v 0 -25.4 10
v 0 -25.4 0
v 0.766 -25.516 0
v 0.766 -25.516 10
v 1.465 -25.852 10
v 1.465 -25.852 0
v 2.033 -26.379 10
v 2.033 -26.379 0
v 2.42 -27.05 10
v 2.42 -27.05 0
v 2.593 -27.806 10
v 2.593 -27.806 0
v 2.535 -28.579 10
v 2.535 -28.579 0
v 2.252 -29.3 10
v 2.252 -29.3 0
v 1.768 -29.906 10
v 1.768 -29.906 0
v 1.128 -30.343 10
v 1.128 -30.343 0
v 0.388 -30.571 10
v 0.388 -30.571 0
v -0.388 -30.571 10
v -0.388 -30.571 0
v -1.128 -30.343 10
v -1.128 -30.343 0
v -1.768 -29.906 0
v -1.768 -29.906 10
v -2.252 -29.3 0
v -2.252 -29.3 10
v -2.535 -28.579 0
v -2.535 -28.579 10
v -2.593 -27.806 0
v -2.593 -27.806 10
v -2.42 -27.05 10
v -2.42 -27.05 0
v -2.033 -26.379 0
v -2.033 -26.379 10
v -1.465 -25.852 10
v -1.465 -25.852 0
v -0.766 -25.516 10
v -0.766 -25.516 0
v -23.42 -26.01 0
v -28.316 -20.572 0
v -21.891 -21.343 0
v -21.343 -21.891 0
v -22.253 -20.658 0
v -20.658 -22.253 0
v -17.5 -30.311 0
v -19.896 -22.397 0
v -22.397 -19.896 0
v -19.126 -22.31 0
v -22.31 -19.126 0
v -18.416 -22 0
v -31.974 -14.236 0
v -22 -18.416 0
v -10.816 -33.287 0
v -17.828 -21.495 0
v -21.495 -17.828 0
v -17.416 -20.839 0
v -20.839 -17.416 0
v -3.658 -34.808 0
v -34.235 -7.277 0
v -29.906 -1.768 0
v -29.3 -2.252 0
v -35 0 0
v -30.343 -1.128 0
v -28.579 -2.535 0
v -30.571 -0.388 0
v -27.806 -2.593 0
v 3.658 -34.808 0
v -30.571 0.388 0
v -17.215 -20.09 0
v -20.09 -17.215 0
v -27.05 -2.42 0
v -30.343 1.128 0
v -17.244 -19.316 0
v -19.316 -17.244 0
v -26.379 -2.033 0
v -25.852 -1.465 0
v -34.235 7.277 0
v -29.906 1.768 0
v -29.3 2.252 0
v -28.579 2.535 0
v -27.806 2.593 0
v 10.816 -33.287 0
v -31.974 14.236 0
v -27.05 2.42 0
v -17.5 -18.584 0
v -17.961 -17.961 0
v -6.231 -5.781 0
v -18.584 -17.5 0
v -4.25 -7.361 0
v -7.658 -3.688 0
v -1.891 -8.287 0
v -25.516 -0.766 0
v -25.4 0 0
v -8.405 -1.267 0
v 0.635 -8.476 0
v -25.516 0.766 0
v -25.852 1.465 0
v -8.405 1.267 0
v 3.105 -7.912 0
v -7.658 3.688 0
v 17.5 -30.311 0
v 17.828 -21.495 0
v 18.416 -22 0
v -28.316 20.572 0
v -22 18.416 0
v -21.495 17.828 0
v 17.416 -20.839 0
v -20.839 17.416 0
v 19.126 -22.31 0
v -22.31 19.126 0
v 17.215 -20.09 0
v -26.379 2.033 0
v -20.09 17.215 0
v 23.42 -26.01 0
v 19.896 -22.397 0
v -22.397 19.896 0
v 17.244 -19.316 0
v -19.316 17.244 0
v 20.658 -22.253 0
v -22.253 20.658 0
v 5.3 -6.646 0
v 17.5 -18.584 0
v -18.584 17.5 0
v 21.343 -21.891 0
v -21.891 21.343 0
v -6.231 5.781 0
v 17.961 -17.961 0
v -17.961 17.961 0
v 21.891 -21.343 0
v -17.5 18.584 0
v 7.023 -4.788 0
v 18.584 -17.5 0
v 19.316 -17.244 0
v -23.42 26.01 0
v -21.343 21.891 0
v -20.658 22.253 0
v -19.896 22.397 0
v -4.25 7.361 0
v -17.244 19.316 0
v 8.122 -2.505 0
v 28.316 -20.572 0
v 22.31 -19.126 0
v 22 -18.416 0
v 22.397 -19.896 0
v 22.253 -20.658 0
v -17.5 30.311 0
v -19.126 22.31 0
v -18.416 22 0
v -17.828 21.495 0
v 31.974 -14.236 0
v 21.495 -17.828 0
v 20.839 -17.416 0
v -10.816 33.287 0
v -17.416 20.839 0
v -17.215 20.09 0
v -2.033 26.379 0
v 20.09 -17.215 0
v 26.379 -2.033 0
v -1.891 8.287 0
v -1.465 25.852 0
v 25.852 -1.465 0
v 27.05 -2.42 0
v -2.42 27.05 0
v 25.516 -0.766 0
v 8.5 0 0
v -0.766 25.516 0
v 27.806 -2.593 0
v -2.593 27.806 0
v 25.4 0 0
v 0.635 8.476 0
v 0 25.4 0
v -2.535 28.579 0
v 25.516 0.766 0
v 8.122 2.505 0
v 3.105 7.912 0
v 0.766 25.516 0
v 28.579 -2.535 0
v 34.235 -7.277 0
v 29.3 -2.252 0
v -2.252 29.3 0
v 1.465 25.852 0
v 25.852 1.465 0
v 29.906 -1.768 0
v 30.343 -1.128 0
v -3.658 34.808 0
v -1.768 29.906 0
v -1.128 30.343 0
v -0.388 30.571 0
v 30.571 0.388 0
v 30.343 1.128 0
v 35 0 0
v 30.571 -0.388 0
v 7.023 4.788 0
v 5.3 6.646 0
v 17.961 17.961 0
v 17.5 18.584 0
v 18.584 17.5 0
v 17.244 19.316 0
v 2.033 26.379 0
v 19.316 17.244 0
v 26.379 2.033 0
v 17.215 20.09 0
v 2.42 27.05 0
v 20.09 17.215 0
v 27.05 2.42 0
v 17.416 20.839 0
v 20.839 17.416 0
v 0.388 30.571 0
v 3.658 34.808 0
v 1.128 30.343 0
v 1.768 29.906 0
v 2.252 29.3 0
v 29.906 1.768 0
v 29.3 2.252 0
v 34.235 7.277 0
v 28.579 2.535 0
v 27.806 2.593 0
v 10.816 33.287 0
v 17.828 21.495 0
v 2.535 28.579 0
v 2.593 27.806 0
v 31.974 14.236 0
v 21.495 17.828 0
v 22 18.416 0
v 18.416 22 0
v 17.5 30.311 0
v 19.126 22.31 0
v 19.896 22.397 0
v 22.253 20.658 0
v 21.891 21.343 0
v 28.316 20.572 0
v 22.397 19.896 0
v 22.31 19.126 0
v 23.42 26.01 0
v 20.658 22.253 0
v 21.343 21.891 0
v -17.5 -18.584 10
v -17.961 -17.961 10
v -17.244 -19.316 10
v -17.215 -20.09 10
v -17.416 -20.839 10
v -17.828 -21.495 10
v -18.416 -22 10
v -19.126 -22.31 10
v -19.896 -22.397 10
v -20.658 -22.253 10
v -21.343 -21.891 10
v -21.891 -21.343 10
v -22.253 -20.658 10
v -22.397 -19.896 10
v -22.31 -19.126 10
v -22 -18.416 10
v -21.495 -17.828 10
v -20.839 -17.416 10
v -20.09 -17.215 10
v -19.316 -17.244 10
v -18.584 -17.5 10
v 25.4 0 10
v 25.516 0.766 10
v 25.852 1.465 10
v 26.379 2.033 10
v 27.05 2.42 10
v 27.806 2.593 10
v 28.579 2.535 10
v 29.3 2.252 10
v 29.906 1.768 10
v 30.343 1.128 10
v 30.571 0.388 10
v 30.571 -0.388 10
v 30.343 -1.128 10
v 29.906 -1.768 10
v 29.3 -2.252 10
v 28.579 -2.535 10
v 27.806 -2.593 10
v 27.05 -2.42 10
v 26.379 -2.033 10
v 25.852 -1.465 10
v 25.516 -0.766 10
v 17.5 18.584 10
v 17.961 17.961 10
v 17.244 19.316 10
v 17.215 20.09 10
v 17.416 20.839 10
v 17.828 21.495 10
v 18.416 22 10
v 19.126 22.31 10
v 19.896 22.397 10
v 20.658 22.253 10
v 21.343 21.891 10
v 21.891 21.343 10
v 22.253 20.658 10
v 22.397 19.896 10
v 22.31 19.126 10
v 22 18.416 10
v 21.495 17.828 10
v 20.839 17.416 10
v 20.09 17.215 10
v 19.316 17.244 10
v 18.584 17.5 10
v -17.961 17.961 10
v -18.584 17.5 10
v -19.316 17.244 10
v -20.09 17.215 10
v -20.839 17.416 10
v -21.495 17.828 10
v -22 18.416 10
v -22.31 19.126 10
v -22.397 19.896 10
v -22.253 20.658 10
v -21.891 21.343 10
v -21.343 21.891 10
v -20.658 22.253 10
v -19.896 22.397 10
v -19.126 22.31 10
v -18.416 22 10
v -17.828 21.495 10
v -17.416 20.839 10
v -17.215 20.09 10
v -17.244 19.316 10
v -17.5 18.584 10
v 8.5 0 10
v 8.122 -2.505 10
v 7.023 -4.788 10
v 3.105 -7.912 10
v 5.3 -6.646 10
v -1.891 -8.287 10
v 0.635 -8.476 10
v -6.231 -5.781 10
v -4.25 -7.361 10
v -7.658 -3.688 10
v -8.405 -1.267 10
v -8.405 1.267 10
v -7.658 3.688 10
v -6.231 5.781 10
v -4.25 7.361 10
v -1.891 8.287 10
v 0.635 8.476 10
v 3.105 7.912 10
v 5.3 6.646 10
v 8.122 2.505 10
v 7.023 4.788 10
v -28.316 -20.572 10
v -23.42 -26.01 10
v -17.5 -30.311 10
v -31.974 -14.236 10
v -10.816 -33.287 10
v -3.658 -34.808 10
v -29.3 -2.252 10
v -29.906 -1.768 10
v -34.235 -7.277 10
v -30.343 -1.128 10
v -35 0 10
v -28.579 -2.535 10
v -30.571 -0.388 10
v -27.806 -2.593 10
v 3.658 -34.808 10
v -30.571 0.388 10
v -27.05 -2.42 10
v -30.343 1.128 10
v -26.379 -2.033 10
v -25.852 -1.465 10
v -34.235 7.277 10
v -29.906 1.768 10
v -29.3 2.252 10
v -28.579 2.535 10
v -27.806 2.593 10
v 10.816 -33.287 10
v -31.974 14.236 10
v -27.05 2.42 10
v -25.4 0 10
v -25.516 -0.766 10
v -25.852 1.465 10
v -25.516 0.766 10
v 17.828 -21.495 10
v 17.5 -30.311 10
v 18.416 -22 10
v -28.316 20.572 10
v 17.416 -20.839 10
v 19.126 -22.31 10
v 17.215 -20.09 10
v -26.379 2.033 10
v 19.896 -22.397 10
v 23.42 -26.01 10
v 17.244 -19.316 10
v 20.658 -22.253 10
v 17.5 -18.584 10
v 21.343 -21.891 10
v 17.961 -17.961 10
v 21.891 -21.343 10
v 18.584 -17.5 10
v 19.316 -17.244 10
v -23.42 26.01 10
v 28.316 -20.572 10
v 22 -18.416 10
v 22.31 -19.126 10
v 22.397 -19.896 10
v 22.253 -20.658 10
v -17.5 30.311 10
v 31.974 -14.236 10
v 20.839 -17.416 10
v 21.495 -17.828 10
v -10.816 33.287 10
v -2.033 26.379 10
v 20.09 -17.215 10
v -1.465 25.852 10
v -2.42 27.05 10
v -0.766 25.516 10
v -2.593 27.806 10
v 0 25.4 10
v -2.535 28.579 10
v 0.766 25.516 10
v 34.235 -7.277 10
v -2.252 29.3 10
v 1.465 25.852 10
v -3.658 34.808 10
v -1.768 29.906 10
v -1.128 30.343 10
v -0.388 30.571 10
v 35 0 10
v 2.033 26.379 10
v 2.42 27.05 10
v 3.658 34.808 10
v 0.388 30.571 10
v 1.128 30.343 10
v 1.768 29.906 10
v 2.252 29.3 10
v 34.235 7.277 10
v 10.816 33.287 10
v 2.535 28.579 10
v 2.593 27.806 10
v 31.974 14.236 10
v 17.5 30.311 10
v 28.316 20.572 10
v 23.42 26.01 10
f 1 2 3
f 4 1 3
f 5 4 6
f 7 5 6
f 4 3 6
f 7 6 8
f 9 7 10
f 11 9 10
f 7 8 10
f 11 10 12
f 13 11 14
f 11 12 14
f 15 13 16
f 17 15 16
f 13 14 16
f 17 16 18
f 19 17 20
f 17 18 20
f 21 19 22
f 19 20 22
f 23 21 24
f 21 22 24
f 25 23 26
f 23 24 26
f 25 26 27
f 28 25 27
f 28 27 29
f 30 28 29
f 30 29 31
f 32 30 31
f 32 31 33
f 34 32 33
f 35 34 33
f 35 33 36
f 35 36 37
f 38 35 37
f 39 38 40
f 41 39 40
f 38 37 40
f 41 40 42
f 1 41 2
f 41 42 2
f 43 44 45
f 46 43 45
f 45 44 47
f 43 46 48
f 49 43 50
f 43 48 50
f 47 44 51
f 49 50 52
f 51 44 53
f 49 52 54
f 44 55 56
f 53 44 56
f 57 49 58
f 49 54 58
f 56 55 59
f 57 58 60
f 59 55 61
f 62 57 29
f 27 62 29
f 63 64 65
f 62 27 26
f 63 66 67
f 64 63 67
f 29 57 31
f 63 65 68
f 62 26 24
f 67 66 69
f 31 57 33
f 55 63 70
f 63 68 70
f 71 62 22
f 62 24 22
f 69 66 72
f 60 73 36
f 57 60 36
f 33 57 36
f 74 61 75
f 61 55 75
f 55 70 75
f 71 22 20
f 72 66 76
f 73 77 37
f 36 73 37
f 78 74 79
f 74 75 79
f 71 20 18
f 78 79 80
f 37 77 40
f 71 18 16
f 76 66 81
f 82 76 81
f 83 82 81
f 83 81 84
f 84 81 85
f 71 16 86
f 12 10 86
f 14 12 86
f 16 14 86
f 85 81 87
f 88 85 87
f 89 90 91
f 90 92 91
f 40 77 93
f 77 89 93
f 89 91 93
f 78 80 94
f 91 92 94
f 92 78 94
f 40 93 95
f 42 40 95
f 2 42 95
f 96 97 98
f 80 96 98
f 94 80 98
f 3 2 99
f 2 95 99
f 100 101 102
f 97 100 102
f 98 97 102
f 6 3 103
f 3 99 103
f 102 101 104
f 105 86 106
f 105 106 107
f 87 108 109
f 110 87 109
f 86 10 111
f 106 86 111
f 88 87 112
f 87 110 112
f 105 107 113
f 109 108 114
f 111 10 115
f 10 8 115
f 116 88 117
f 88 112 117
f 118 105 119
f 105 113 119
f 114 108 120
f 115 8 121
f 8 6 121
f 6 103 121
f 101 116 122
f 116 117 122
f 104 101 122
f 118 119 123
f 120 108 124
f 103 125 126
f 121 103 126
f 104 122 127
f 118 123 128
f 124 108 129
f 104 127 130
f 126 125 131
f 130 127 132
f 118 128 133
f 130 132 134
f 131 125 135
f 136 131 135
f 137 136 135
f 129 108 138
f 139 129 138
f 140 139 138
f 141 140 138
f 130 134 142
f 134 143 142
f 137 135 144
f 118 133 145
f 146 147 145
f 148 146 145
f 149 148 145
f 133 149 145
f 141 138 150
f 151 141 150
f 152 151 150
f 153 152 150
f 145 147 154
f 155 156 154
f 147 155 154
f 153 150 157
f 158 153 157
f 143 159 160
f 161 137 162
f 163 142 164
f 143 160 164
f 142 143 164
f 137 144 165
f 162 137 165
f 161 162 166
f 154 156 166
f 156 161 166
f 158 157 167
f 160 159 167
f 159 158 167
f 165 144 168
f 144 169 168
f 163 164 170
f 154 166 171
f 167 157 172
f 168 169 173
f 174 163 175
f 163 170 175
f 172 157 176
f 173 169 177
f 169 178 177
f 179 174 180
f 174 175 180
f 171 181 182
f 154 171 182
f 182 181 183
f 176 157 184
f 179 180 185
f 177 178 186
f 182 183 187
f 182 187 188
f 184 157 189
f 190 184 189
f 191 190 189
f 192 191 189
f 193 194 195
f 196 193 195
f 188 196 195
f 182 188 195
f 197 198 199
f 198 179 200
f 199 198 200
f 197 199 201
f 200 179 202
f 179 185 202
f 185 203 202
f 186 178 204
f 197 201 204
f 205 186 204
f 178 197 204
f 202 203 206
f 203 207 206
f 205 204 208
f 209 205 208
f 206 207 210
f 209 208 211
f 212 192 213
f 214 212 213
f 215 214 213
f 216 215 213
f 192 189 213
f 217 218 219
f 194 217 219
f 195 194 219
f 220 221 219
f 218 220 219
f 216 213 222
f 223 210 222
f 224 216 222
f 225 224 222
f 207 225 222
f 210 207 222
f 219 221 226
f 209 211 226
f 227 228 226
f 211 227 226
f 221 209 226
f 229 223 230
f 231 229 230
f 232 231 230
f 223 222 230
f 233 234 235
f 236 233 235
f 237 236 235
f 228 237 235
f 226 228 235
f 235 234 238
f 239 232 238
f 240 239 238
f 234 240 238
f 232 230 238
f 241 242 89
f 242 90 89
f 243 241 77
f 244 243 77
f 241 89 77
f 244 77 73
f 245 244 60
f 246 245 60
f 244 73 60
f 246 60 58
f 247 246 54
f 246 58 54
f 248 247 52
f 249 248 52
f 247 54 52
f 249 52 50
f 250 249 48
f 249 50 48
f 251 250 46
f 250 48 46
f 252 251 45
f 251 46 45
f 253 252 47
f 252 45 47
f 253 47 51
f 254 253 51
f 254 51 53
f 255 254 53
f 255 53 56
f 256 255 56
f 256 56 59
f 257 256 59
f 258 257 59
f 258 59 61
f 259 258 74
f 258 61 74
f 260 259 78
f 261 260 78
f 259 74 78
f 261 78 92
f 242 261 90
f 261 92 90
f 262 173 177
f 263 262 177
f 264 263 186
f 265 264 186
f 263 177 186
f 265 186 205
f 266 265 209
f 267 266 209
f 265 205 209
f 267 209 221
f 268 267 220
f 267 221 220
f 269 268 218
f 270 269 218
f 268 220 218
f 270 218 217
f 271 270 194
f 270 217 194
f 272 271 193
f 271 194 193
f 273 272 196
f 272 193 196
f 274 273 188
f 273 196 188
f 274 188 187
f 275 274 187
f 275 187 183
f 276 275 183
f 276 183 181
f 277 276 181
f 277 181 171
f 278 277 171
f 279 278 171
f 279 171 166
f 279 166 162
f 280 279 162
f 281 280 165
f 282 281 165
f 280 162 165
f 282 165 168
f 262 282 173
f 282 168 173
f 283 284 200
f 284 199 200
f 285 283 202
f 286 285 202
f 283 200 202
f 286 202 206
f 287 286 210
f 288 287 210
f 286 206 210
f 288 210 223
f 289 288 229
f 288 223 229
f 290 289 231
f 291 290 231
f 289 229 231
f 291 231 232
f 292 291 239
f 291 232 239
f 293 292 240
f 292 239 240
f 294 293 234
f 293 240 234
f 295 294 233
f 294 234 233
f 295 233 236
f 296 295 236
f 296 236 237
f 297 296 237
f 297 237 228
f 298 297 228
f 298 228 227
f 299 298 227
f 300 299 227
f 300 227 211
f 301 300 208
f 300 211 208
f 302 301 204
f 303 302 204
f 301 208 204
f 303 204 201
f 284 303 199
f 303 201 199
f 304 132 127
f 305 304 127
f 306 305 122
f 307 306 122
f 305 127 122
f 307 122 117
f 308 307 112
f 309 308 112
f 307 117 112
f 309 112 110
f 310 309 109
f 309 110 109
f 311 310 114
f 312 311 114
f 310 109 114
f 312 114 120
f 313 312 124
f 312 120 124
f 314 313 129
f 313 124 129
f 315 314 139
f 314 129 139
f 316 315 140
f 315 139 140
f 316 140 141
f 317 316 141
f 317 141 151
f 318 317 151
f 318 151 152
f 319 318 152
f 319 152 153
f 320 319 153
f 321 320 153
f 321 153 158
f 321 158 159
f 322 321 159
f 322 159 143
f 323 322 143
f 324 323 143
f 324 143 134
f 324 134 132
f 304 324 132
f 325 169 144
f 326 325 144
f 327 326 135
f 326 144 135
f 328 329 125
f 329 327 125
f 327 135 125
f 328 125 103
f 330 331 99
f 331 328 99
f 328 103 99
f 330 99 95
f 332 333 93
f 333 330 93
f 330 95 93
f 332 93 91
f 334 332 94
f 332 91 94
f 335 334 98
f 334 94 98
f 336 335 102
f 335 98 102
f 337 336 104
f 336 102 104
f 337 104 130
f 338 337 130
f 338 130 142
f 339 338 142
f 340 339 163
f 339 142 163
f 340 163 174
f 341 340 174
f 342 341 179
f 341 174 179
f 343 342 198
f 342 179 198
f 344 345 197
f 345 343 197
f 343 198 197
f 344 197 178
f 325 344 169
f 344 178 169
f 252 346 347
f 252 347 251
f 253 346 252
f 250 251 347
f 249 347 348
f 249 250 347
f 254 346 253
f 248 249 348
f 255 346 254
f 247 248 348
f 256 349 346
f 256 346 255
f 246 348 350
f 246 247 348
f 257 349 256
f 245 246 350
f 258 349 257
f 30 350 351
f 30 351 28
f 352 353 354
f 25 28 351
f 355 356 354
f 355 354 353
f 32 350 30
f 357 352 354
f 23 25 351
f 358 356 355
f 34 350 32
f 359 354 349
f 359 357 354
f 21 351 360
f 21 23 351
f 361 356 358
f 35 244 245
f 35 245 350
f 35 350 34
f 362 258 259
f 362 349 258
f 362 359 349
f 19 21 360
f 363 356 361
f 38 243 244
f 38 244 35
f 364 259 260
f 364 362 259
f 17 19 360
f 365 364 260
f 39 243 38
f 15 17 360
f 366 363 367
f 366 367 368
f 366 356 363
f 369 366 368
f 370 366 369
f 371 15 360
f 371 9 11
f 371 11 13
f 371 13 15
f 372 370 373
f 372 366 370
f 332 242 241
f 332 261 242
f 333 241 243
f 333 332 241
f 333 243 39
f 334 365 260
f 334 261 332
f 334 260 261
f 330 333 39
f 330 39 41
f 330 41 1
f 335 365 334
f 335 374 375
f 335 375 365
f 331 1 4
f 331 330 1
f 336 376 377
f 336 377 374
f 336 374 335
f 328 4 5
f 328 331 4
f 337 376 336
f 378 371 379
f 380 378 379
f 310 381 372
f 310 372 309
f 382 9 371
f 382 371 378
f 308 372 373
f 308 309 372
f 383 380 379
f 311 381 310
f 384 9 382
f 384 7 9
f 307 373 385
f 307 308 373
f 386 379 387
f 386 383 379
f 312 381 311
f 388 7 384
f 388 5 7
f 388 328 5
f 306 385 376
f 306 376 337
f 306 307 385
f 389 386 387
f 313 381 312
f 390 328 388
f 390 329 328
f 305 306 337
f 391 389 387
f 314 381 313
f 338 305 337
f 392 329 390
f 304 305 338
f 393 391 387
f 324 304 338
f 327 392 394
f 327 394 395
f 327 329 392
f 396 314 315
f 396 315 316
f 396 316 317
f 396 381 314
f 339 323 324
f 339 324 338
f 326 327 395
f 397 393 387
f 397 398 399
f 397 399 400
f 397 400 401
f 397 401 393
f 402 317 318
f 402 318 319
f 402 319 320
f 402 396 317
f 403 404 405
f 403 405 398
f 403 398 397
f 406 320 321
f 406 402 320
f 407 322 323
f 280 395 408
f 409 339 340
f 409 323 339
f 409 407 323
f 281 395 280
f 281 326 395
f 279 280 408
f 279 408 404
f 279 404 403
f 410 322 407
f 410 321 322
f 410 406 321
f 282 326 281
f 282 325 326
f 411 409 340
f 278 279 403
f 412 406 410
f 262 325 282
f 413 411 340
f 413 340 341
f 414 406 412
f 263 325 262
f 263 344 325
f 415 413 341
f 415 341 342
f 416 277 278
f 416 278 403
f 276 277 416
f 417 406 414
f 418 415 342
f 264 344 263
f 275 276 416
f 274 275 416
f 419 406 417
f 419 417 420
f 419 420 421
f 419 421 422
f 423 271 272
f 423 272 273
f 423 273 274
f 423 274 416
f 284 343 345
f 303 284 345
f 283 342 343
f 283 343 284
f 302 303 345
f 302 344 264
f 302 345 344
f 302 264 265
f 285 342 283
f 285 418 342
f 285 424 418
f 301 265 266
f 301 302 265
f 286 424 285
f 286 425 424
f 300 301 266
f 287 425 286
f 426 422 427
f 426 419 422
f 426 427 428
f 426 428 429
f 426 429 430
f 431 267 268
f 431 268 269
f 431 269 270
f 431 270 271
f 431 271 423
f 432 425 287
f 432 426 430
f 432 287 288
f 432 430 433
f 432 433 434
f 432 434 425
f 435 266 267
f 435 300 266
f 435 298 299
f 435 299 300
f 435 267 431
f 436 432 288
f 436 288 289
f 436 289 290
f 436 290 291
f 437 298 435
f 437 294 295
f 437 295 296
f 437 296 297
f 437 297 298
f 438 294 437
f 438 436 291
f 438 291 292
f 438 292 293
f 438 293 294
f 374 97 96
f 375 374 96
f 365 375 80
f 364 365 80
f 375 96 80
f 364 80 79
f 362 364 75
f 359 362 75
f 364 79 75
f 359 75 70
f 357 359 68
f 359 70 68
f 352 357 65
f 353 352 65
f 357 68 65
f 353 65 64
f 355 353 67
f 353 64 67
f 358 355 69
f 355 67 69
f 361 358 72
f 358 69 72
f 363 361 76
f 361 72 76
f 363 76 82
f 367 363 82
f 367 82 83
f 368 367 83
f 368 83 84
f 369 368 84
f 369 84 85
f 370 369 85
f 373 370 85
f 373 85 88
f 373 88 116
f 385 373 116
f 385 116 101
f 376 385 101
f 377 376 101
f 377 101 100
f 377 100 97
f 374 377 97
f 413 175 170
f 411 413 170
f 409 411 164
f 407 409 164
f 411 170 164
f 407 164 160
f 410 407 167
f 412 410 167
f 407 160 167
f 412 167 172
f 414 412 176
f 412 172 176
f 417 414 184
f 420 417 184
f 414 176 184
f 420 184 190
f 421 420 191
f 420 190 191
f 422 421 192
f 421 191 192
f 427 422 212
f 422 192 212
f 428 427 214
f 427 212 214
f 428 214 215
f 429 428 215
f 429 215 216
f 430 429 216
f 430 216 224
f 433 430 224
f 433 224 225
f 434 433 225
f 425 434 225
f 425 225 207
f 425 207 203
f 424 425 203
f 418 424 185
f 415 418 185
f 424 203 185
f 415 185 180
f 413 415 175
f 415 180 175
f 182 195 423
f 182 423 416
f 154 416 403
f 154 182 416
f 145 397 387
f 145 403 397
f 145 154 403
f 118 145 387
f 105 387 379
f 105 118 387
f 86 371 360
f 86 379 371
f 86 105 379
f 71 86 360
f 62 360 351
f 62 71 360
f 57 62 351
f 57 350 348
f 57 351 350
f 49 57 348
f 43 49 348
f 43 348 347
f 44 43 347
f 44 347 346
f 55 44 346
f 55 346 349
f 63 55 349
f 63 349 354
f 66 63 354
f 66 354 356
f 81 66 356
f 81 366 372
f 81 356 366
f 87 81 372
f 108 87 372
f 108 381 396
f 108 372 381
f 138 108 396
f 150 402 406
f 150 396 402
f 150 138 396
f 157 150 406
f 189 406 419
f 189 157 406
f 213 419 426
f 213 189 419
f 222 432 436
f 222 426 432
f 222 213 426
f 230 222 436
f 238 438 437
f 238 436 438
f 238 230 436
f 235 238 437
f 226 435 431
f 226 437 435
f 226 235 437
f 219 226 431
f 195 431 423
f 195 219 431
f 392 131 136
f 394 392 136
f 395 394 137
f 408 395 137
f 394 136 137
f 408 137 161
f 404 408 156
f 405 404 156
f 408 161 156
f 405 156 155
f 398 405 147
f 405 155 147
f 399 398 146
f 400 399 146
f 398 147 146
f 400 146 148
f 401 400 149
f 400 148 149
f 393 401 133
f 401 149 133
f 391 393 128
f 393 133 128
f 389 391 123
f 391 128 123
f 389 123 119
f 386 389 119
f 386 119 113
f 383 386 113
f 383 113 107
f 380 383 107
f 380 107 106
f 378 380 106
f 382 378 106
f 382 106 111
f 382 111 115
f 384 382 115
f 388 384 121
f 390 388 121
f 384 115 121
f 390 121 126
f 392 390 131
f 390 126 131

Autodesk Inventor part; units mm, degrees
ref_plane "YZ Plane" through (0, 0, 0) normal (1, 0, 0) x (0, 1, 0)
ref_plane "XZ Plane" through (0, 0, 0) normal (0, 1, 0) x (-1, 0, 0)
ref_plane "XY Plane" through (0, 0, 0) normal (0, 0, 1) x (1, 0, 0)
sketch "Sketch1" plane through (0, 0, 0) normal (0, 0, 1) x (1, 0, 0)
  circle A0 centre (0, 0) radius 8.5
  circle A1 centre (0, 0) radius 35
  dimension "d0" = 17
  dimension "d1" = 70
extrude "Extrusion1" add sketch "Sketch1" along normal blind 10
sketch "Sketch2" plane through (0, 0, 10) normal (0, 0, 1) x (1, 0, 0)
  circle A0 centre (0, 28) radius 2.2143
  point P0 (0, 0)
  dimension "d4" = 28
hole "Hole1" at (0, 28, 10) direction (0, 0, -1) diameter 5.2 end through all
thread "Thread1" size "M5.5x0.5" class "6H" standard "ANSI Metric M Profile" full length
pattern_circular "Circular Pattern1" count 8 over 360 about axis through (0, 0, 0) along (0, 0, 1) of "Hole1"
properties part number "Nose Hub"
